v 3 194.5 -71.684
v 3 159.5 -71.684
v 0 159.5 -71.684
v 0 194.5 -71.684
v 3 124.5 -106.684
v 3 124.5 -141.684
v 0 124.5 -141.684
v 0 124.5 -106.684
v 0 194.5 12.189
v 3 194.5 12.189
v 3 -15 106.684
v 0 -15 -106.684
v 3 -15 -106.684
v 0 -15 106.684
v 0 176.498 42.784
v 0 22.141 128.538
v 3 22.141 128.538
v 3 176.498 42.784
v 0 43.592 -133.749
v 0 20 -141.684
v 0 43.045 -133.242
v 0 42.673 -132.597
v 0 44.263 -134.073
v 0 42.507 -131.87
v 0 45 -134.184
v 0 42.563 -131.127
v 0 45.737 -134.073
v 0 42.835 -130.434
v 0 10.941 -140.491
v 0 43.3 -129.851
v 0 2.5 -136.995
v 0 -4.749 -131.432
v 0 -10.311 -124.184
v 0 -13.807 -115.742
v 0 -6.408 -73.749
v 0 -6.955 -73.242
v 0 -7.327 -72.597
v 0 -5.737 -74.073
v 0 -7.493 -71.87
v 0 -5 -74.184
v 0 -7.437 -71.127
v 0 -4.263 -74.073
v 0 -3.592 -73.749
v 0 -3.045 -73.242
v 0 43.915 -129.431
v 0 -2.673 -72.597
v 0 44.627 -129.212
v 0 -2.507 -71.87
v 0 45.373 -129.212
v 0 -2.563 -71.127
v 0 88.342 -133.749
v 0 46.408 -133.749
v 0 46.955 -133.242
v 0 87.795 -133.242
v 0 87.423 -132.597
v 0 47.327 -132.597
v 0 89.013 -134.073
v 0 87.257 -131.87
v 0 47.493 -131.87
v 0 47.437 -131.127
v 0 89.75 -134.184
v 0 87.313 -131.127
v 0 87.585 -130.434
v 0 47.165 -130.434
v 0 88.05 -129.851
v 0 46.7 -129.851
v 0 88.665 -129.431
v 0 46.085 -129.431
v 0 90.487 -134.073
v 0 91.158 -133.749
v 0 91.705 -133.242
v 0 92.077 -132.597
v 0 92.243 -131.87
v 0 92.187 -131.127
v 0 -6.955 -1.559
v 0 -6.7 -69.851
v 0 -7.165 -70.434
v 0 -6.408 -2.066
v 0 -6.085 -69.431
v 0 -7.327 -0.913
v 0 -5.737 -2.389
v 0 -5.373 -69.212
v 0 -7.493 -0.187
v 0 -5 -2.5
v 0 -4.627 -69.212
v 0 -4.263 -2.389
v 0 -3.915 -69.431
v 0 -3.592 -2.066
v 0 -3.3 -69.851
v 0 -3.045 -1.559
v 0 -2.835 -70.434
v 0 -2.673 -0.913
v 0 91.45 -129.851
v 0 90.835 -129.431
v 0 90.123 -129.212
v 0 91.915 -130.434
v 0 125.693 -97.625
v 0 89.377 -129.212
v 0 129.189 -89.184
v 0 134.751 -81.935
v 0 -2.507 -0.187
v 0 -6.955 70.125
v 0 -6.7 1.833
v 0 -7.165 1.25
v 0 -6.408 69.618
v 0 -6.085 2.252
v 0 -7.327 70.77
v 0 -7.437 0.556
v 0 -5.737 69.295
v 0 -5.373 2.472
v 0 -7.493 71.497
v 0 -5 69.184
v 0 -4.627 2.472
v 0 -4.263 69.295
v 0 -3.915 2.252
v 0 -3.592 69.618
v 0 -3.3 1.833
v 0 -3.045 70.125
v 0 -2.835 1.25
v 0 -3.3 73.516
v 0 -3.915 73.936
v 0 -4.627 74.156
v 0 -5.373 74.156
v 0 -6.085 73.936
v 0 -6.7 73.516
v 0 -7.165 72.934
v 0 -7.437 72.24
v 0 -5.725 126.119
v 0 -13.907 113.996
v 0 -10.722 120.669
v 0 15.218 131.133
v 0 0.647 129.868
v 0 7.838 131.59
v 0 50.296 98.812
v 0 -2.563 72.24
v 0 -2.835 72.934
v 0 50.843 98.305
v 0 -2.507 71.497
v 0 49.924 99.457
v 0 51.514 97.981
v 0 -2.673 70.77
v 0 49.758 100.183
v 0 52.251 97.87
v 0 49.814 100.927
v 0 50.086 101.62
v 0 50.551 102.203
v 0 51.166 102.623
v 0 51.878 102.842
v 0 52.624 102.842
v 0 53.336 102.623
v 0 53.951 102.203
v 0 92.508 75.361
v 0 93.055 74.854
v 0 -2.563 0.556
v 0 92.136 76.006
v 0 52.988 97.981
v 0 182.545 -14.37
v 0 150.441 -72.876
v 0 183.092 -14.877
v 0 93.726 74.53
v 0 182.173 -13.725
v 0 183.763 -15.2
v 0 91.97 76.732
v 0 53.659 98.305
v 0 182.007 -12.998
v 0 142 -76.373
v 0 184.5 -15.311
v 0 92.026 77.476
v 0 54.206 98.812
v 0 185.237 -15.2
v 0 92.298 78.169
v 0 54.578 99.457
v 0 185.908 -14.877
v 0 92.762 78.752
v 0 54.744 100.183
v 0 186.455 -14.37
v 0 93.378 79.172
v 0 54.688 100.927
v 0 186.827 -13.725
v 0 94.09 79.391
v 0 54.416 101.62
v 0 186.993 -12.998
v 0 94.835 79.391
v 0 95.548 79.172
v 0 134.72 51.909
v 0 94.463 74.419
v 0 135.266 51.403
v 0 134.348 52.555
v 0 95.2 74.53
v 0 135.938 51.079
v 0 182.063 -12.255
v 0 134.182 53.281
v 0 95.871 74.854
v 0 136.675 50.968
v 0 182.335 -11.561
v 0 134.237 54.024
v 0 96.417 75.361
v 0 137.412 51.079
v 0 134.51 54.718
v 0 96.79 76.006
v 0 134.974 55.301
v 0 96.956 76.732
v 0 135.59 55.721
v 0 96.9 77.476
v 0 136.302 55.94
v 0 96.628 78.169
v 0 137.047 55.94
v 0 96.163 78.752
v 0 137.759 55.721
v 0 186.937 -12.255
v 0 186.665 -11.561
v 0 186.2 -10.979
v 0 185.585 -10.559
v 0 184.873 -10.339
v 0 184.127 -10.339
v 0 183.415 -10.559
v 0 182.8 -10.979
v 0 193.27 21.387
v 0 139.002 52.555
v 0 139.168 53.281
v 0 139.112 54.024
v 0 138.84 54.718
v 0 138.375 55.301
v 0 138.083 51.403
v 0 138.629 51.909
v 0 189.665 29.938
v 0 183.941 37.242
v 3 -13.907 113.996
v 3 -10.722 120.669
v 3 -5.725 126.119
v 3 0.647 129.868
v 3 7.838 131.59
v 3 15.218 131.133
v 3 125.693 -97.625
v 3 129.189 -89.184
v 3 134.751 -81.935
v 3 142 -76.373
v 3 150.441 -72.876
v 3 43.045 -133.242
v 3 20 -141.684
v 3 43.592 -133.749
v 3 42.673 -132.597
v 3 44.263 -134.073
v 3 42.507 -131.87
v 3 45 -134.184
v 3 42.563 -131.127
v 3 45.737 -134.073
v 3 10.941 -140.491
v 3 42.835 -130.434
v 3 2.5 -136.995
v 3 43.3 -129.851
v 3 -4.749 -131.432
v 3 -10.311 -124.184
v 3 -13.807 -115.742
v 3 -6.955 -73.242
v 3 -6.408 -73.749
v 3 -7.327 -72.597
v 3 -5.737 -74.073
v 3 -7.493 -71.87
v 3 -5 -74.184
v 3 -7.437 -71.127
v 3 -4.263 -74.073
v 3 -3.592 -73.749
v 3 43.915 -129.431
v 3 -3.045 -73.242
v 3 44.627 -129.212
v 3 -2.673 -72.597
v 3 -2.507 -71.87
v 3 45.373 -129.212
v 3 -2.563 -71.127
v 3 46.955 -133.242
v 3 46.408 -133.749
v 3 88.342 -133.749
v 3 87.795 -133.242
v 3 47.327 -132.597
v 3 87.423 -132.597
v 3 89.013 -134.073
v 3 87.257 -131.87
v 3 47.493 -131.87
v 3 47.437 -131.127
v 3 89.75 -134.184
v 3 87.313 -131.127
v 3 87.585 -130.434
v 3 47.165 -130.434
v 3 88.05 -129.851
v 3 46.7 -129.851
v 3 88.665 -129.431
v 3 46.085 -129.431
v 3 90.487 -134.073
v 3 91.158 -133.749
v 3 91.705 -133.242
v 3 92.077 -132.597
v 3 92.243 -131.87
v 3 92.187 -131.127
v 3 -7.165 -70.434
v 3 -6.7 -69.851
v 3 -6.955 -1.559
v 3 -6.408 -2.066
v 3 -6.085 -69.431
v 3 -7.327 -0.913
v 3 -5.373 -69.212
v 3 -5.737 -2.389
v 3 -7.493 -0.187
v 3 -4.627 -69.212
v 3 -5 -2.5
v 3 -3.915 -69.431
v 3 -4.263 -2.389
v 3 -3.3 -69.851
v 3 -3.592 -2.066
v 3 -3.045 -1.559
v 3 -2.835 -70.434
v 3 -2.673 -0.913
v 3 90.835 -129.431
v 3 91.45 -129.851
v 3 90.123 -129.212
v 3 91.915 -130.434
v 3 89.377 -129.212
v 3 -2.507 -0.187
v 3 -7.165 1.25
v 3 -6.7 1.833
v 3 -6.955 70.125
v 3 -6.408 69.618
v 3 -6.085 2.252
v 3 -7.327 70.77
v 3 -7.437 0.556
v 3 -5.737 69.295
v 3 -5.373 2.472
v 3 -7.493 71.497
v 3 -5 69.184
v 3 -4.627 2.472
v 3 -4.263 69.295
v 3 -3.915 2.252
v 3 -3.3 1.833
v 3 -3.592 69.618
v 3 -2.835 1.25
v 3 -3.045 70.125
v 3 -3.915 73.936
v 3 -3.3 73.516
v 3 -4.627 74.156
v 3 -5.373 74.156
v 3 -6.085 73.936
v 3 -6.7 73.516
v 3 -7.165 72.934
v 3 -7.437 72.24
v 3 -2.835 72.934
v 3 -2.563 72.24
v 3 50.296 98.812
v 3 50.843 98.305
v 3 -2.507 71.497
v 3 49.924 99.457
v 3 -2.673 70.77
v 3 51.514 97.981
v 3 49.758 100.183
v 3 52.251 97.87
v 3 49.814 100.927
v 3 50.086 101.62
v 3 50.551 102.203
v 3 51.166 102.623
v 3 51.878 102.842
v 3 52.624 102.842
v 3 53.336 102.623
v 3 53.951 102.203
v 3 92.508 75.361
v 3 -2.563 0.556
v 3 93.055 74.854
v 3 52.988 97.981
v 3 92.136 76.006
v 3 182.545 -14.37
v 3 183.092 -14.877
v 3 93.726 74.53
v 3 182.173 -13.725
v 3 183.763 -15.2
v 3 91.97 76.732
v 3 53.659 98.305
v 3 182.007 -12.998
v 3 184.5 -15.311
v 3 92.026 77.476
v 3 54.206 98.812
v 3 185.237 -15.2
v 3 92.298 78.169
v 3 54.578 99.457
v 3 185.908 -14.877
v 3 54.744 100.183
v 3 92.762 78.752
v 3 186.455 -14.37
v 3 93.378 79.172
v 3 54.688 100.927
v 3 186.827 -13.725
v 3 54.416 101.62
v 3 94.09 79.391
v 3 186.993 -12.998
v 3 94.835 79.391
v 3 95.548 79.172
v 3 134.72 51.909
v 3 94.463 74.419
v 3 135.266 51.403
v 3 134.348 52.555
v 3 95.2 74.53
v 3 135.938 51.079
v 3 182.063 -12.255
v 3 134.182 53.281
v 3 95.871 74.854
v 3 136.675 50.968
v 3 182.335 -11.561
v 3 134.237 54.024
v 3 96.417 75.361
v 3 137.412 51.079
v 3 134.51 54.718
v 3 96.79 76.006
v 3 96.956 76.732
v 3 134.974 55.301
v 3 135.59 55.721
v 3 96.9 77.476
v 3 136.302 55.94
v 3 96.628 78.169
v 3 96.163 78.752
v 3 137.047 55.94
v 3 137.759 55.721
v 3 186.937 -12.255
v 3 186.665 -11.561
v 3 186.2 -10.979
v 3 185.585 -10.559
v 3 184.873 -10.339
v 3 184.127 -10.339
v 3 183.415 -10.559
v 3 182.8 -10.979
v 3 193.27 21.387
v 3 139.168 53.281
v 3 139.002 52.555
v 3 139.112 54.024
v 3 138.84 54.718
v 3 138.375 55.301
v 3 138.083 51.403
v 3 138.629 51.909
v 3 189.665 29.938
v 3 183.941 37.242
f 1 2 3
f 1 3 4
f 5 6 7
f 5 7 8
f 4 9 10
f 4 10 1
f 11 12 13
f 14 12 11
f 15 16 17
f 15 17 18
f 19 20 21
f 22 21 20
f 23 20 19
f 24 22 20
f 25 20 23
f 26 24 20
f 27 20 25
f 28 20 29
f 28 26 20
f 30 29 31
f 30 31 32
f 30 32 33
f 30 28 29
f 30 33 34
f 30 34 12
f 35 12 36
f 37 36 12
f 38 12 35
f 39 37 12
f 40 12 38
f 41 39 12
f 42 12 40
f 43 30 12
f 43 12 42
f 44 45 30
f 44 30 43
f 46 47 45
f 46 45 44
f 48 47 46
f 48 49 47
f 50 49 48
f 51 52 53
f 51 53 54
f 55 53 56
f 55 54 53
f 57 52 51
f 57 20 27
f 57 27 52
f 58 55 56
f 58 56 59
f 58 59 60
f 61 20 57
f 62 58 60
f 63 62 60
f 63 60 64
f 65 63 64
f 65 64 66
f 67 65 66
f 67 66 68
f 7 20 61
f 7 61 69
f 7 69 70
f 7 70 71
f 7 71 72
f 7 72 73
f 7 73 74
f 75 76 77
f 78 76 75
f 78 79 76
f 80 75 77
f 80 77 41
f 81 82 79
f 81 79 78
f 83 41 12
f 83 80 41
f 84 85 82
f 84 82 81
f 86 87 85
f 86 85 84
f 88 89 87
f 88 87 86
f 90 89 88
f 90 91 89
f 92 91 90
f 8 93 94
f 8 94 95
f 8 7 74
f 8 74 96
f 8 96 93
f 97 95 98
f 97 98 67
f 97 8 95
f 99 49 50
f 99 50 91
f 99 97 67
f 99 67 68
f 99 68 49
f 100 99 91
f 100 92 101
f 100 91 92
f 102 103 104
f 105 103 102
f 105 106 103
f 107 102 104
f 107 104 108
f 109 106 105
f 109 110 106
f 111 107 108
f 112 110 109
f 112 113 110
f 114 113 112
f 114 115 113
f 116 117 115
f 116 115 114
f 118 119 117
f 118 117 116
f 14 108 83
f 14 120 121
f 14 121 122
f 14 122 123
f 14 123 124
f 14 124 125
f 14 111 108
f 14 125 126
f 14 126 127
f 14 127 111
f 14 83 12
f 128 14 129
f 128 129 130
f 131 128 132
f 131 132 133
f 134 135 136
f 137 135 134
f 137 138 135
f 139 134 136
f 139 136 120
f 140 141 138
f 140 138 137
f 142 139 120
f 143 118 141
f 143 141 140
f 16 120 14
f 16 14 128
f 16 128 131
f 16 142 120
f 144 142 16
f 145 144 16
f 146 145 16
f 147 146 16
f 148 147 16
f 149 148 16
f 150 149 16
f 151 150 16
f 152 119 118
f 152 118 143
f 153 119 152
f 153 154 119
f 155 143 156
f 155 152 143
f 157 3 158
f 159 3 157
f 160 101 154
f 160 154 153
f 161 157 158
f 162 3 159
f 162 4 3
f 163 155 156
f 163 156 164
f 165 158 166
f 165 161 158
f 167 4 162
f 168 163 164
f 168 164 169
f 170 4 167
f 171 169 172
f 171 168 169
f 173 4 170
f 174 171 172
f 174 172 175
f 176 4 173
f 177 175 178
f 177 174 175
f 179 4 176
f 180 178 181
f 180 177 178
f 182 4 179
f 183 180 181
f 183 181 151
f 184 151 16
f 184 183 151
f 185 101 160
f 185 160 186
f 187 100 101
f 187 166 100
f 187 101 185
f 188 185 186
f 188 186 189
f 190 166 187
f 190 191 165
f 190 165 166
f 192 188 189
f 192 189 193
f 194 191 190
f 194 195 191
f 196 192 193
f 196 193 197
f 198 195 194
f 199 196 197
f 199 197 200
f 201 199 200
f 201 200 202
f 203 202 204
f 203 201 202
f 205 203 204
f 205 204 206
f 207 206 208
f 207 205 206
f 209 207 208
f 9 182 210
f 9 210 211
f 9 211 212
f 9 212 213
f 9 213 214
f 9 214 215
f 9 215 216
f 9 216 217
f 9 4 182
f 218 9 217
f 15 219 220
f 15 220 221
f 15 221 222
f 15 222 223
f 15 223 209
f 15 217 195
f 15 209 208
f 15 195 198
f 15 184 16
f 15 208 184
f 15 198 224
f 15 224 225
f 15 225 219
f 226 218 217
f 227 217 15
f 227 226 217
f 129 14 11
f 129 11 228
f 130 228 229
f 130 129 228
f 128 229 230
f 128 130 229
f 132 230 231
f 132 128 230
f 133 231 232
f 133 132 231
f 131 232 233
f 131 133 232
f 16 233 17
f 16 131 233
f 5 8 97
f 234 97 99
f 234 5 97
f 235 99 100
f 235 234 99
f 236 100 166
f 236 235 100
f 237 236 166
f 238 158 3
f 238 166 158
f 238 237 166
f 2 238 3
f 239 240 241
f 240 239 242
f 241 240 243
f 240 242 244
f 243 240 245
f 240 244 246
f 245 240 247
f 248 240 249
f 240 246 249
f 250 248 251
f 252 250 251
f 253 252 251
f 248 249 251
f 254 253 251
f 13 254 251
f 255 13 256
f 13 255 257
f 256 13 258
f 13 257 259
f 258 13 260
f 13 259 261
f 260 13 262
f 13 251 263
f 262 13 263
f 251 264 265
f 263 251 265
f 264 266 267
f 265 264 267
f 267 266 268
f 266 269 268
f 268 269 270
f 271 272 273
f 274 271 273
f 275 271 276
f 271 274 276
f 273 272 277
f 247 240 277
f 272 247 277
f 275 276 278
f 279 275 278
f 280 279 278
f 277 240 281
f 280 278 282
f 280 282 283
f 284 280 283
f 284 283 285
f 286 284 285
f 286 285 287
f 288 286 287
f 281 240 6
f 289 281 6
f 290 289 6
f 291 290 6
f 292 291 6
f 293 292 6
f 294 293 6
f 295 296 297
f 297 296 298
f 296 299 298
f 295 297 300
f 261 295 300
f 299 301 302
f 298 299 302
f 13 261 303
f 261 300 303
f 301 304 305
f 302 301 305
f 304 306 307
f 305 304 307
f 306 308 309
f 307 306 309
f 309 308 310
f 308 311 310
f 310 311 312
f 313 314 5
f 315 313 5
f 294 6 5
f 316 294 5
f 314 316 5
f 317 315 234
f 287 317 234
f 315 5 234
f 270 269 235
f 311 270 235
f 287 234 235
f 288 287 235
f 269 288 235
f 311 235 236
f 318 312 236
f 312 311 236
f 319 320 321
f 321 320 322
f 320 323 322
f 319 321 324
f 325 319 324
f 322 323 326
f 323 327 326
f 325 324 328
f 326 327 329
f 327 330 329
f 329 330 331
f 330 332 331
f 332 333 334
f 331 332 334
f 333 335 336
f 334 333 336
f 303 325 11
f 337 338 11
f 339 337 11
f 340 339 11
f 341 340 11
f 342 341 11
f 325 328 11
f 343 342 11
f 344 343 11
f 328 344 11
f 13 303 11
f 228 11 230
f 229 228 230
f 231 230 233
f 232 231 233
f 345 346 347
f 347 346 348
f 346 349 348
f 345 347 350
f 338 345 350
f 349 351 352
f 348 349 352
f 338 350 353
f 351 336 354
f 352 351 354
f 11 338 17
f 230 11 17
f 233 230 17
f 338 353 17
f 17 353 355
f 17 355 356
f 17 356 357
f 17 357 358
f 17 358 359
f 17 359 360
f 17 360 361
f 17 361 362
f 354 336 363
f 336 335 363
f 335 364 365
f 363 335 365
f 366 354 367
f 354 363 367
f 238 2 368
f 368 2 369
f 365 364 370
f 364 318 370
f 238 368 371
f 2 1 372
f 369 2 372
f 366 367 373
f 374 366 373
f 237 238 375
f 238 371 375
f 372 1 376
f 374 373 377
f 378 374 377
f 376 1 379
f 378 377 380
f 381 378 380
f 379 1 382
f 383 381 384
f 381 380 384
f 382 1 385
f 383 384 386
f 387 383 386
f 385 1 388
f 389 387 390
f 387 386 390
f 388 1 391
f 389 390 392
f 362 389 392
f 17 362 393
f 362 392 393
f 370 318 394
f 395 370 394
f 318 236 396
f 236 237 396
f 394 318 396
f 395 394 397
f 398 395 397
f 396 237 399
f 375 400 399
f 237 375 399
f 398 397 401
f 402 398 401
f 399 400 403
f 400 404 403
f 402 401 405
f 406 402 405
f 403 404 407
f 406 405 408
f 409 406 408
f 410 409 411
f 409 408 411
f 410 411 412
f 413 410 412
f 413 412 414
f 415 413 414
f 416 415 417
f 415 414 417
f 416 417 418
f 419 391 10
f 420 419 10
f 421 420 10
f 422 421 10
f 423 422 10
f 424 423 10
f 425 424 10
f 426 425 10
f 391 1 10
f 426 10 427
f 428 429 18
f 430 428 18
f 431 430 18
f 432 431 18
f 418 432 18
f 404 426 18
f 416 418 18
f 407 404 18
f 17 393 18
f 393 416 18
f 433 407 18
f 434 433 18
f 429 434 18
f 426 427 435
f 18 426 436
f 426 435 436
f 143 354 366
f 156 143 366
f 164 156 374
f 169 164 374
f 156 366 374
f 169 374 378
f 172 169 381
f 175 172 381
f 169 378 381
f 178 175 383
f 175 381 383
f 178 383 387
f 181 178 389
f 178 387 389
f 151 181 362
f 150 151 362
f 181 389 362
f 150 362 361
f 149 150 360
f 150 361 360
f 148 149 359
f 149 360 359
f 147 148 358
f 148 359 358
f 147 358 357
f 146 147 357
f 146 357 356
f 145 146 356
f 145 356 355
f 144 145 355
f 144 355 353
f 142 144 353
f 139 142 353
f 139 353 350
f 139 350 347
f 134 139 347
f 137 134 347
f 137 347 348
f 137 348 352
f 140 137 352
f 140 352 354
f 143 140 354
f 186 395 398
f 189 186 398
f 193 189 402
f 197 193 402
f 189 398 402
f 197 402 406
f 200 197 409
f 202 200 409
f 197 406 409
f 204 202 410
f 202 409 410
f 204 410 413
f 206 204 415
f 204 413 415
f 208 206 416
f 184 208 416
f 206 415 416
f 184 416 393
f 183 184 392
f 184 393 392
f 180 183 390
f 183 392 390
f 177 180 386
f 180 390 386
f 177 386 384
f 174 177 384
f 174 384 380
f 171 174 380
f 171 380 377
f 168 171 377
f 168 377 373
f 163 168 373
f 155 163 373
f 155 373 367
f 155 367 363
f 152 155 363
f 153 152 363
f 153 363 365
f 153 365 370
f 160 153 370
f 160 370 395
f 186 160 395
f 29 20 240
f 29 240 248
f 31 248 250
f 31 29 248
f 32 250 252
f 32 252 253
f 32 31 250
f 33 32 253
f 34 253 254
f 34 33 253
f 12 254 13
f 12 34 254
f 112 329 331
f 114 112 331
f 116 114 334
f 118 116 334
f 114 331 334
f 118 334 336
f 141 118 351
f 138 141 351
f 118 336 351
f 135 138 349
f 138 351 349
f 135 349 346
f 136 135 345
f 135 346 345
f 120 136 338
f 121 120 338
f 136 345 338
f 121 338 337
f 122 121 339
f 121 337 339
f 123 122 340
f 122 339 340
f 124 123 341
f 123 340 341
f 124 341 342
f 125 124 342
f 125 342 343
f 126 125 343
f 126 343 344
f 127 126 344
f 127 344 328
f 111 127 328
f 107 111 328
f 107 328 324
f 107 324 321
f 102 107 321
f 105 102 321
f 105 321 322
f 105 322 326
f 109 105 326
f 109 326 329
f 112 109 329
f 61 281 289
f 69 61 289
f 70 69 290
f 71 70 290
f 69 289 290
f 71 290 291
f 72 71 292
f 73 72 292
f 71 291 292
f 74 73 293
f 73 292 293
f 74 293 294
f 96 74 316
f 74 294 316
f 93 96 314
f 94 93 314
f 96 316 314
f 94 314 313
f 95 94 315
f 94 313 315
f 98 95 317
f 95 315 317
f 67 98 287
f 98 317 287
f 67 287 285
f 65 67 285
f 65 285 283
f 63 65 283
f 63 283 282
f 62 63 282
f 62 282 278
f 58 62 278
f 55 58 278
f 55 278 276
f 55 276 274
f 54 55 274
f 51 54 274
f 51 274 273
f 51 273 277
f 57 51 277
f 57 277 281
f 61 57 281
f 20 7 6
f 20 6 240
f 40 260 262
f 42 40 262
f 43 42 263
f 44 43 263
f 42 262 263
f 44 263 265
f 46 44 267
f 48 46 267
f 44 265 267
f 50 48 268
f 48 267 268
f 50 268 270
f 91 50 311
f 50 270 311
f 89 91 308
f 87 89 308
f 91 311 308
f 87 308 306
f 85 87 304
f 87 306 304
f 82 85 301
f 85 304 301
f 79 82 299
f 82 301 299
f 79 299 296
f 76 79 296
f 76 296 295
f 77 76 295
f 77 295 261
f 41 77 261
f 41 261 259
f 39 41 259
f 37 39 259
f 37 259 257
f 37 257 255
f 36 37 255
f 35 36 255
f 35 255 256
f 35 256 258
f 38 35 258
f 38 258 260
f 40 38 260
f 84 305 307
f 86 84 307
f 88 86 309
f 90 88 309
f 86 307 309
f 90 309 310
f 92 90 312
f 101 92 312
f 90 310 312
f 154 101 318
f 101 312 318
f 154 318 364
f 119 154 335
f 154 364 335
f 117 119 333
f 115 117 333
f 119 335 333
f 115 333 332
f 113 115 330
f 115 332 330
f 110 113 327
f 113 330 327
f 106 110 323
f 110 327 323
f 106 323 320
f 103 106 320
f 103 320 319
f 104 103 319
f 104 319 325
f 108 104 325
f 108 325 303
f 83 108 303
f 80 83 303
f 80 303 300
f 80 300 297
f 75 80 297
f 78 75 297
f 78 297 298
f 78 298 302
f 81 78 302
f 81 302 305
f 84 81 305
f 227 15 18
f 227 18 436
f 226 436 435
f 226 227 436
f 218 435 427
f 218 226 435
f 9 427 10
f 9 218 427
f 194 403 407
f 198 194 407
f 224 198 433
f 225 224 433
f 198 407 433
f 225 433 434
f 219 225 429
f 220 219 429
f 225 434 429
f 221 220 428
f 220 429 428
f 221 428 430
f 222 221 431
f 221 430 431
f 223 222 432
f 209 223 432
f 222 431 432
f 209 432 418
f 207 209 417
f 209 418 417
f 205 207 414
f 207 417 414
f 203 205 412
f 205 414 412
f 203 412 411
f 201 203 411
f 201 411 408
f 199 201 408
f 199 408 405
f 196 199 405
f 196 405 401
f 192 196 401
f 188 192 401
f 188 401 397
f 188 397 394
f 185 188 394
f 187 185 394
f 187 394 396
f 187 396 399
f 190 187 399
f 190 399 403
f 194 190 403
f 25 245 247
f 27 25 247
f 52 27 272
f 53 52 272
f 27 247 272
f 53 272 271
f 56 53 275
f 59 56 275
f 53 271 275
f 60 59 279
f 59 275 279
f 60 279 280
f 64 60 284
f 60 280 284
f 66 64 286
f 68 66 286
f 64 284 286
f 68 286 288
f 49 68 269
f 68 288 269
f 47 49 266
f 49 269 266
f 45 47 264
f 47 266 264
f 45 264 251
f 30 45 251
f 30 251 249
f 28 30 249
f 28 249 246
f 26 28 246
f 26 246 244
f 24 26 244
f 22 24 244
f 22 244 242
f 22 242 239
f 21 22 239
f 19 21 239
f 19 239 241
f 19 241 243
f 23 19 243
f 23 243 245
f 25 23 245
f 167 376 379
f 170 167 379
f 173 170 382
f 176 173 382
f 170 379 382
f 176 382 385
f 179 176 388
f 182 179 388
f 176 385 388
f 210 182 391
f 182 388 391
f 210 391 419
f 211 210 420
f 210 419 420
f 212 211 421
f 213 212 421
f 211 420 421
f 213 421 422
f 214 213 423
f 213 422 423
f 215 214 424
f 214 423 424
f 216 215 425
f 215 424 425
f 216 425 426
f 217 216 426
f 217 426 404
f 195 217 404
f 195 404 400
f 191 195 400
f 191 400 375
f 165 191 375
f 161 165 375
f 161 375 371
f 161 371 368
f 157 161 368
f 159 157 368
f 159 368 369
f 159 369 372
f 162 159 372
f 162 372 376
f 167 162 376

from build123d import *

# Parameters (mm, degrees)
BOSS_EXTRUDE1_DEPTH = 3
CUT_EXTRUDE1_REACH  = 242.652
SKETCH2_R           = 2.5
CUT_EXTRUDE2_REACH  = 242.652


with BuildPart() as part:
    # Sketch1 → Boss-Extrude1 (new body)
    with BuildSketch(Plane(origin=(0, 0, 0), x_dir=(0, 0, -1), z_dir=(1, 0, 0))):
        with BuildLine():
            Line((-12.188515962, 194.5), (106.683660563, 194.5))
            ThreePointArc((106.683660563, 194.5), (131.432397904, 184.248737342), (141.683660563, 159.5))
            Line((141.683660563, 159.5), (141.683660563, 20))
            ThreePointArc((141.683660563, 20), (131.432397904, -4.748737342), (106.683660563, -15))
            Line((106.683660563, -15), (-106.683660563, -15))
            ThreePointArc((-106.683660563, -15), (-128.230433314, -2.678193247), (-128.537592466, 22.141073279))
            Line((-128.537592466, 22.141073279), (-42.784020626, 176.497502591))
            ThreePointArc((-42.784020626, 176.497502591), (-29.937986507, 189.665481852), (-12.188515962, 194.5))
        make_face()
    extrude(amount=BOSS_EXTRUDE1_DEPTH)

    # Sketch2 → Cut-Extrude1 (cut, up to next)
    with BuildSketch(Plane(origin=(3, 0, 0), x_dir=(0, 0, -1), z_dir=(1, 0, 0)), mode=Mode.PRIVATE) as cut_extrude1_sk1:
        with Locations((81.683660563, 184.5)):
            Circle(SKETCH2_R)
    cut_extrude1_tool1 = extrude(cut_extrude1_sk1.sketch, amount=-CUT_EXTRUDE1_REACH, mode=Mode.PRIVATE) & part.part
    # Sketch2 → Cut-Extrude1 (cut, up to next)
    with BuildSketch(Plane(origin=(3, 0, 0), x_dir=(0, 0, -1), z_dir=(1, 0, 0)), mode=Mode.PRIVATE) as cut_extrude1_sk2:
        with Locations((12.811484038, 184.5)):
            Circle(SKETCH2_R)
    cut_extrude1_tool2 = extrude(cut_extrude1_sk2.sketch, amount=-CUT_EXTRUDE1_REACH, mode=Mode.PRIVATE) & part.part
    # Sketch2 → Cut-Extrude1 (cut, up to next)
    with BuildSketch(Plane(origin=(3, 0, 0), x_dir=(0, 0, -1), z_dir=(1, 0, 0)), mode=Mode.PRIVATE) as cut_extrude1_sk3:
        with Locations((131.683660563, 134.49995686)):
            Circle(SKETCH2_R)
    cut_extrude1_tool3 = extrude(cut_extrude1_sk3.sketch, amount=-CUT_EXTRUDE1_REACH, mode=Mode.PRIVATE) & part.part
    # Sketch2 → Cut-Extrude1 (cut, up to next)
    with BuildSketch(Plane(origin=(3, 0, 0), x_dir=(0, 0, -1), z_dir=(1, 0, 0)), mode=Mode.PRIVATE) as cut_extrude1_sk4:
        with Locations((131.683660563, 89.75)):
            Circle(SKETCH2_R)
    cut_extrude1_tool4 = extrude(cut_extrude1_sk4.sketch, amount=-CUT_EXTRUDE1_REACH, mode=Mode.PRIVATE) & part.part
    # Sketch2 → Cut-Extrude1 (cut, up to next)
    with BuildSketch(Plane(origin=(3, 0, 0), x_dir=(0, 0, -1), z_dir=(1, 0, 0)), mode=Mode.PRIVATE) as cut_extrude1_sk5:
        with Locations((131.683660563, 44.999939605)):
            Circle(SKETCH2_R)
    cut_extrude1_tool5 = extrude(cut_extrude1_sk5.sketch, amount=-CUT_EXTRUDE1_REACH, mode=Mode.PRIVATE) & part.part
    # Sketch2 → Cut-Extrude1 (cut, up to next)
    with BuildSketch(Plane(origin=(3, 0, 0), x_dir=(0, 0, -1), z_dir=(1, 0, 0)), mode=Mode.PRIVATE) as cut_extrude1_sk6:
        with Locations((71.683660563, -5)):
            Circle(SKETCH2_R)
    cut_extrude1_tool6 = extrude(cut_extrude1_sk6.sketch, amount=-CUT_EXTRUDE1_REACH, mode=Mode.PRIVATE) & part.part
    # Sketch2 → Cut-Extrude1 (cut, up to next)
    with BuildSketch(Plane(origin=(3, 0, 0), x_dir=(0, 0, -1), z_dir=(1, 0, 0)), mode=Mode.PRIVATE) as cut_extrude1_sk7:
        with Locations((0, -5)):
            Circle(SKETCH2_R)
    cut_extrude1_tool7 = extrude(cut_extrude1_sk7.sketch, amount=-CUT_EXTRUDE1_REACH, mode=Mode.PRIVATE) & part.part
    # Sketch2 → Cut-Extrude1 (cut, up to next)
    with BuildSketch(Plane(origin=(3, 0, 0), x_dir=(0, 0, -1), z_dir=(1, 0, 0)), mode=Mode.PRIVATE) as cut_extrude1_sk8:
        with Locations((-71.683660563, -5)):
            Circle(SKETCH2_R)
    cut_extrude1_tool8 = extrude(cut_extrude1_sk8.sketch, amount=-CUT_EXTRUDE1_REACH, mode=Mode.PRIVATE) & part.part
    # Sketch2 → Cut-Extrude1 (cut, up to next)
    with BuildSketch(Plane(origin=(3, 0, 0), x_dir=(0, 0, -1), z_dir=(1, 0, 0)), mode=Mode.PRIVATE) as cut_extrude1_sk9:
        with Locations((-100.370302458, 52.250935013)):
            Circle(SKETCH2_R)
    cut_extrude1_tool9 = extrude(cut_extrude1_sk9.sketch, amount=-CUT_EXTRUDE1_REACH, mode=Mode.PRIVATE) & part.part
    # Sketch2 → Cut-Extrude1 (cut, up to next)
    with BuildSketch(Plane(origin=(3, 0, 0), x_dir=(0, 0, -1), z_dir=(1, 0, 0)), mode=Mode.PRIVATE) as cut_extrude1_sk10:
        with Locations((-76.919233785, 94.462858624)):
            Circle(SKETCH2_R)
    cut_extrude1_tool10 = extrude(cut_extrude1_sk10.sketch, amount=-CUT_EXTRUDE1_REACH, mode=Mode.PRIVATE) & part.part
    # Sketch2 → Cut-Extrude1 (cut, up to next)
    with BuildSketch(Plane(origin=(3, 0, 0), x_dir=(0, 0, -1), z_dir=(1, 0, 0)), mode=Mode.PRIVATE) as cut_extrude1_sk11:
        with Locations((-53.468165112, 136.674782235)):
            Circle(SKETCH2_R)
    cut_extrude1_tool11 = extrude(cut_extrude1_sk11.sketch, amount=-CUT_EXTRUDE1_REACH, mode=Mode.PRIVATE) & part.part
    add(cut_extrude1_tool1.solids().sort_by_distance((3, 184.5, -81.683661))[0], mode=Mode.SUBTRACT)
    add(cut_extrude1_tool2.solids().sort_by_distance((3, 184.5, -12.811484))[0], mode=Mode.SUBTRACT)
    add(cut_extrude1_tool3.solids().sort_by_distance((3, 134.499957, -131.683661))[0], mode=Mode.SUBTRACT)
    add(cut_extrude1_tool4.solids().sort_by_distance((3, 89.75, -131.683661))[0], mode=Mode.SUBTRACT)
    add(cut_extrude1_tool5.solids().sort_by_distance((3, 44.99994, -131.683661))[0], mode=Mode.SUBTRACT)
    add(cut_extrude1_tool6.solids().sort_by_distance((3, -5, -71.683661))[0], mode=Mode.SUBTRACT)
    add(cut_extrude1_tool7.solids().sort_by_distance((3, -5, 0))[0], mode=Mode.SUBTRACT)
    add(cut_extrude1_tool8.solids().sort_by_distance((3, -5, 71.683661))[0], mode=Mode.SUBTRACT)
    add(cut_extrude1_tool9.solids().sort_by_distance((3, 52.250935, 100.370302))[0], mode=Mode.SUBTRACT)
    add(cut_extrude1_tool10.solids().sort_by_distance((3, 94.462859, 76.919234))[0], mode=Mode.SUBTRACT)
    add(cut_extrude1_tool11.solids().sort_by_distance((3, 136.674782, 53.468165))[0], mode=Mode.SUBTRACT)

    # Sketch3 → Cut-Extrude2 (cut, up to next)
    with BuildSketch(Plane(origin=(3, 0, 0), x_dir=(0, 0, -1), z_dir=(1, 0, 0)), mode=Mode.PRIVATE) as cut_extrude2_sk1:
        with BuildLine():
            Line((71.683660563, 159.5), (71.683660563, 194.5))
            Line((71.683660563, 194.5), (106.683660563, 194.5))
            ThreePointArc((106.683660563, 194.5), (131.432397904, 184.248737342), (141.683660563, 159.5))
            Line((141.683660563, 159.5), (141.683660563, 124.5))
            Line((141.683660563, 124.5), (106.683660563, 124.5))
            ThreePointArc((106.683660563, 124.5), (81.934923221, 134.751262658), (71.683660563, 159.5))
        make_face()
    cut_extrude2_tool1 = extrude(cut_extrude2_sk1.sketch, amount=-CUT_EXTRUDE2_REACH, mode=Mode.PRIVATE) & part.part
    add(cut_extrude2_tool1.solids().sort_by_distance((3, 159.5, -106.683661))[0], mode=Mode.SUBTRACT)


solid = part.part
